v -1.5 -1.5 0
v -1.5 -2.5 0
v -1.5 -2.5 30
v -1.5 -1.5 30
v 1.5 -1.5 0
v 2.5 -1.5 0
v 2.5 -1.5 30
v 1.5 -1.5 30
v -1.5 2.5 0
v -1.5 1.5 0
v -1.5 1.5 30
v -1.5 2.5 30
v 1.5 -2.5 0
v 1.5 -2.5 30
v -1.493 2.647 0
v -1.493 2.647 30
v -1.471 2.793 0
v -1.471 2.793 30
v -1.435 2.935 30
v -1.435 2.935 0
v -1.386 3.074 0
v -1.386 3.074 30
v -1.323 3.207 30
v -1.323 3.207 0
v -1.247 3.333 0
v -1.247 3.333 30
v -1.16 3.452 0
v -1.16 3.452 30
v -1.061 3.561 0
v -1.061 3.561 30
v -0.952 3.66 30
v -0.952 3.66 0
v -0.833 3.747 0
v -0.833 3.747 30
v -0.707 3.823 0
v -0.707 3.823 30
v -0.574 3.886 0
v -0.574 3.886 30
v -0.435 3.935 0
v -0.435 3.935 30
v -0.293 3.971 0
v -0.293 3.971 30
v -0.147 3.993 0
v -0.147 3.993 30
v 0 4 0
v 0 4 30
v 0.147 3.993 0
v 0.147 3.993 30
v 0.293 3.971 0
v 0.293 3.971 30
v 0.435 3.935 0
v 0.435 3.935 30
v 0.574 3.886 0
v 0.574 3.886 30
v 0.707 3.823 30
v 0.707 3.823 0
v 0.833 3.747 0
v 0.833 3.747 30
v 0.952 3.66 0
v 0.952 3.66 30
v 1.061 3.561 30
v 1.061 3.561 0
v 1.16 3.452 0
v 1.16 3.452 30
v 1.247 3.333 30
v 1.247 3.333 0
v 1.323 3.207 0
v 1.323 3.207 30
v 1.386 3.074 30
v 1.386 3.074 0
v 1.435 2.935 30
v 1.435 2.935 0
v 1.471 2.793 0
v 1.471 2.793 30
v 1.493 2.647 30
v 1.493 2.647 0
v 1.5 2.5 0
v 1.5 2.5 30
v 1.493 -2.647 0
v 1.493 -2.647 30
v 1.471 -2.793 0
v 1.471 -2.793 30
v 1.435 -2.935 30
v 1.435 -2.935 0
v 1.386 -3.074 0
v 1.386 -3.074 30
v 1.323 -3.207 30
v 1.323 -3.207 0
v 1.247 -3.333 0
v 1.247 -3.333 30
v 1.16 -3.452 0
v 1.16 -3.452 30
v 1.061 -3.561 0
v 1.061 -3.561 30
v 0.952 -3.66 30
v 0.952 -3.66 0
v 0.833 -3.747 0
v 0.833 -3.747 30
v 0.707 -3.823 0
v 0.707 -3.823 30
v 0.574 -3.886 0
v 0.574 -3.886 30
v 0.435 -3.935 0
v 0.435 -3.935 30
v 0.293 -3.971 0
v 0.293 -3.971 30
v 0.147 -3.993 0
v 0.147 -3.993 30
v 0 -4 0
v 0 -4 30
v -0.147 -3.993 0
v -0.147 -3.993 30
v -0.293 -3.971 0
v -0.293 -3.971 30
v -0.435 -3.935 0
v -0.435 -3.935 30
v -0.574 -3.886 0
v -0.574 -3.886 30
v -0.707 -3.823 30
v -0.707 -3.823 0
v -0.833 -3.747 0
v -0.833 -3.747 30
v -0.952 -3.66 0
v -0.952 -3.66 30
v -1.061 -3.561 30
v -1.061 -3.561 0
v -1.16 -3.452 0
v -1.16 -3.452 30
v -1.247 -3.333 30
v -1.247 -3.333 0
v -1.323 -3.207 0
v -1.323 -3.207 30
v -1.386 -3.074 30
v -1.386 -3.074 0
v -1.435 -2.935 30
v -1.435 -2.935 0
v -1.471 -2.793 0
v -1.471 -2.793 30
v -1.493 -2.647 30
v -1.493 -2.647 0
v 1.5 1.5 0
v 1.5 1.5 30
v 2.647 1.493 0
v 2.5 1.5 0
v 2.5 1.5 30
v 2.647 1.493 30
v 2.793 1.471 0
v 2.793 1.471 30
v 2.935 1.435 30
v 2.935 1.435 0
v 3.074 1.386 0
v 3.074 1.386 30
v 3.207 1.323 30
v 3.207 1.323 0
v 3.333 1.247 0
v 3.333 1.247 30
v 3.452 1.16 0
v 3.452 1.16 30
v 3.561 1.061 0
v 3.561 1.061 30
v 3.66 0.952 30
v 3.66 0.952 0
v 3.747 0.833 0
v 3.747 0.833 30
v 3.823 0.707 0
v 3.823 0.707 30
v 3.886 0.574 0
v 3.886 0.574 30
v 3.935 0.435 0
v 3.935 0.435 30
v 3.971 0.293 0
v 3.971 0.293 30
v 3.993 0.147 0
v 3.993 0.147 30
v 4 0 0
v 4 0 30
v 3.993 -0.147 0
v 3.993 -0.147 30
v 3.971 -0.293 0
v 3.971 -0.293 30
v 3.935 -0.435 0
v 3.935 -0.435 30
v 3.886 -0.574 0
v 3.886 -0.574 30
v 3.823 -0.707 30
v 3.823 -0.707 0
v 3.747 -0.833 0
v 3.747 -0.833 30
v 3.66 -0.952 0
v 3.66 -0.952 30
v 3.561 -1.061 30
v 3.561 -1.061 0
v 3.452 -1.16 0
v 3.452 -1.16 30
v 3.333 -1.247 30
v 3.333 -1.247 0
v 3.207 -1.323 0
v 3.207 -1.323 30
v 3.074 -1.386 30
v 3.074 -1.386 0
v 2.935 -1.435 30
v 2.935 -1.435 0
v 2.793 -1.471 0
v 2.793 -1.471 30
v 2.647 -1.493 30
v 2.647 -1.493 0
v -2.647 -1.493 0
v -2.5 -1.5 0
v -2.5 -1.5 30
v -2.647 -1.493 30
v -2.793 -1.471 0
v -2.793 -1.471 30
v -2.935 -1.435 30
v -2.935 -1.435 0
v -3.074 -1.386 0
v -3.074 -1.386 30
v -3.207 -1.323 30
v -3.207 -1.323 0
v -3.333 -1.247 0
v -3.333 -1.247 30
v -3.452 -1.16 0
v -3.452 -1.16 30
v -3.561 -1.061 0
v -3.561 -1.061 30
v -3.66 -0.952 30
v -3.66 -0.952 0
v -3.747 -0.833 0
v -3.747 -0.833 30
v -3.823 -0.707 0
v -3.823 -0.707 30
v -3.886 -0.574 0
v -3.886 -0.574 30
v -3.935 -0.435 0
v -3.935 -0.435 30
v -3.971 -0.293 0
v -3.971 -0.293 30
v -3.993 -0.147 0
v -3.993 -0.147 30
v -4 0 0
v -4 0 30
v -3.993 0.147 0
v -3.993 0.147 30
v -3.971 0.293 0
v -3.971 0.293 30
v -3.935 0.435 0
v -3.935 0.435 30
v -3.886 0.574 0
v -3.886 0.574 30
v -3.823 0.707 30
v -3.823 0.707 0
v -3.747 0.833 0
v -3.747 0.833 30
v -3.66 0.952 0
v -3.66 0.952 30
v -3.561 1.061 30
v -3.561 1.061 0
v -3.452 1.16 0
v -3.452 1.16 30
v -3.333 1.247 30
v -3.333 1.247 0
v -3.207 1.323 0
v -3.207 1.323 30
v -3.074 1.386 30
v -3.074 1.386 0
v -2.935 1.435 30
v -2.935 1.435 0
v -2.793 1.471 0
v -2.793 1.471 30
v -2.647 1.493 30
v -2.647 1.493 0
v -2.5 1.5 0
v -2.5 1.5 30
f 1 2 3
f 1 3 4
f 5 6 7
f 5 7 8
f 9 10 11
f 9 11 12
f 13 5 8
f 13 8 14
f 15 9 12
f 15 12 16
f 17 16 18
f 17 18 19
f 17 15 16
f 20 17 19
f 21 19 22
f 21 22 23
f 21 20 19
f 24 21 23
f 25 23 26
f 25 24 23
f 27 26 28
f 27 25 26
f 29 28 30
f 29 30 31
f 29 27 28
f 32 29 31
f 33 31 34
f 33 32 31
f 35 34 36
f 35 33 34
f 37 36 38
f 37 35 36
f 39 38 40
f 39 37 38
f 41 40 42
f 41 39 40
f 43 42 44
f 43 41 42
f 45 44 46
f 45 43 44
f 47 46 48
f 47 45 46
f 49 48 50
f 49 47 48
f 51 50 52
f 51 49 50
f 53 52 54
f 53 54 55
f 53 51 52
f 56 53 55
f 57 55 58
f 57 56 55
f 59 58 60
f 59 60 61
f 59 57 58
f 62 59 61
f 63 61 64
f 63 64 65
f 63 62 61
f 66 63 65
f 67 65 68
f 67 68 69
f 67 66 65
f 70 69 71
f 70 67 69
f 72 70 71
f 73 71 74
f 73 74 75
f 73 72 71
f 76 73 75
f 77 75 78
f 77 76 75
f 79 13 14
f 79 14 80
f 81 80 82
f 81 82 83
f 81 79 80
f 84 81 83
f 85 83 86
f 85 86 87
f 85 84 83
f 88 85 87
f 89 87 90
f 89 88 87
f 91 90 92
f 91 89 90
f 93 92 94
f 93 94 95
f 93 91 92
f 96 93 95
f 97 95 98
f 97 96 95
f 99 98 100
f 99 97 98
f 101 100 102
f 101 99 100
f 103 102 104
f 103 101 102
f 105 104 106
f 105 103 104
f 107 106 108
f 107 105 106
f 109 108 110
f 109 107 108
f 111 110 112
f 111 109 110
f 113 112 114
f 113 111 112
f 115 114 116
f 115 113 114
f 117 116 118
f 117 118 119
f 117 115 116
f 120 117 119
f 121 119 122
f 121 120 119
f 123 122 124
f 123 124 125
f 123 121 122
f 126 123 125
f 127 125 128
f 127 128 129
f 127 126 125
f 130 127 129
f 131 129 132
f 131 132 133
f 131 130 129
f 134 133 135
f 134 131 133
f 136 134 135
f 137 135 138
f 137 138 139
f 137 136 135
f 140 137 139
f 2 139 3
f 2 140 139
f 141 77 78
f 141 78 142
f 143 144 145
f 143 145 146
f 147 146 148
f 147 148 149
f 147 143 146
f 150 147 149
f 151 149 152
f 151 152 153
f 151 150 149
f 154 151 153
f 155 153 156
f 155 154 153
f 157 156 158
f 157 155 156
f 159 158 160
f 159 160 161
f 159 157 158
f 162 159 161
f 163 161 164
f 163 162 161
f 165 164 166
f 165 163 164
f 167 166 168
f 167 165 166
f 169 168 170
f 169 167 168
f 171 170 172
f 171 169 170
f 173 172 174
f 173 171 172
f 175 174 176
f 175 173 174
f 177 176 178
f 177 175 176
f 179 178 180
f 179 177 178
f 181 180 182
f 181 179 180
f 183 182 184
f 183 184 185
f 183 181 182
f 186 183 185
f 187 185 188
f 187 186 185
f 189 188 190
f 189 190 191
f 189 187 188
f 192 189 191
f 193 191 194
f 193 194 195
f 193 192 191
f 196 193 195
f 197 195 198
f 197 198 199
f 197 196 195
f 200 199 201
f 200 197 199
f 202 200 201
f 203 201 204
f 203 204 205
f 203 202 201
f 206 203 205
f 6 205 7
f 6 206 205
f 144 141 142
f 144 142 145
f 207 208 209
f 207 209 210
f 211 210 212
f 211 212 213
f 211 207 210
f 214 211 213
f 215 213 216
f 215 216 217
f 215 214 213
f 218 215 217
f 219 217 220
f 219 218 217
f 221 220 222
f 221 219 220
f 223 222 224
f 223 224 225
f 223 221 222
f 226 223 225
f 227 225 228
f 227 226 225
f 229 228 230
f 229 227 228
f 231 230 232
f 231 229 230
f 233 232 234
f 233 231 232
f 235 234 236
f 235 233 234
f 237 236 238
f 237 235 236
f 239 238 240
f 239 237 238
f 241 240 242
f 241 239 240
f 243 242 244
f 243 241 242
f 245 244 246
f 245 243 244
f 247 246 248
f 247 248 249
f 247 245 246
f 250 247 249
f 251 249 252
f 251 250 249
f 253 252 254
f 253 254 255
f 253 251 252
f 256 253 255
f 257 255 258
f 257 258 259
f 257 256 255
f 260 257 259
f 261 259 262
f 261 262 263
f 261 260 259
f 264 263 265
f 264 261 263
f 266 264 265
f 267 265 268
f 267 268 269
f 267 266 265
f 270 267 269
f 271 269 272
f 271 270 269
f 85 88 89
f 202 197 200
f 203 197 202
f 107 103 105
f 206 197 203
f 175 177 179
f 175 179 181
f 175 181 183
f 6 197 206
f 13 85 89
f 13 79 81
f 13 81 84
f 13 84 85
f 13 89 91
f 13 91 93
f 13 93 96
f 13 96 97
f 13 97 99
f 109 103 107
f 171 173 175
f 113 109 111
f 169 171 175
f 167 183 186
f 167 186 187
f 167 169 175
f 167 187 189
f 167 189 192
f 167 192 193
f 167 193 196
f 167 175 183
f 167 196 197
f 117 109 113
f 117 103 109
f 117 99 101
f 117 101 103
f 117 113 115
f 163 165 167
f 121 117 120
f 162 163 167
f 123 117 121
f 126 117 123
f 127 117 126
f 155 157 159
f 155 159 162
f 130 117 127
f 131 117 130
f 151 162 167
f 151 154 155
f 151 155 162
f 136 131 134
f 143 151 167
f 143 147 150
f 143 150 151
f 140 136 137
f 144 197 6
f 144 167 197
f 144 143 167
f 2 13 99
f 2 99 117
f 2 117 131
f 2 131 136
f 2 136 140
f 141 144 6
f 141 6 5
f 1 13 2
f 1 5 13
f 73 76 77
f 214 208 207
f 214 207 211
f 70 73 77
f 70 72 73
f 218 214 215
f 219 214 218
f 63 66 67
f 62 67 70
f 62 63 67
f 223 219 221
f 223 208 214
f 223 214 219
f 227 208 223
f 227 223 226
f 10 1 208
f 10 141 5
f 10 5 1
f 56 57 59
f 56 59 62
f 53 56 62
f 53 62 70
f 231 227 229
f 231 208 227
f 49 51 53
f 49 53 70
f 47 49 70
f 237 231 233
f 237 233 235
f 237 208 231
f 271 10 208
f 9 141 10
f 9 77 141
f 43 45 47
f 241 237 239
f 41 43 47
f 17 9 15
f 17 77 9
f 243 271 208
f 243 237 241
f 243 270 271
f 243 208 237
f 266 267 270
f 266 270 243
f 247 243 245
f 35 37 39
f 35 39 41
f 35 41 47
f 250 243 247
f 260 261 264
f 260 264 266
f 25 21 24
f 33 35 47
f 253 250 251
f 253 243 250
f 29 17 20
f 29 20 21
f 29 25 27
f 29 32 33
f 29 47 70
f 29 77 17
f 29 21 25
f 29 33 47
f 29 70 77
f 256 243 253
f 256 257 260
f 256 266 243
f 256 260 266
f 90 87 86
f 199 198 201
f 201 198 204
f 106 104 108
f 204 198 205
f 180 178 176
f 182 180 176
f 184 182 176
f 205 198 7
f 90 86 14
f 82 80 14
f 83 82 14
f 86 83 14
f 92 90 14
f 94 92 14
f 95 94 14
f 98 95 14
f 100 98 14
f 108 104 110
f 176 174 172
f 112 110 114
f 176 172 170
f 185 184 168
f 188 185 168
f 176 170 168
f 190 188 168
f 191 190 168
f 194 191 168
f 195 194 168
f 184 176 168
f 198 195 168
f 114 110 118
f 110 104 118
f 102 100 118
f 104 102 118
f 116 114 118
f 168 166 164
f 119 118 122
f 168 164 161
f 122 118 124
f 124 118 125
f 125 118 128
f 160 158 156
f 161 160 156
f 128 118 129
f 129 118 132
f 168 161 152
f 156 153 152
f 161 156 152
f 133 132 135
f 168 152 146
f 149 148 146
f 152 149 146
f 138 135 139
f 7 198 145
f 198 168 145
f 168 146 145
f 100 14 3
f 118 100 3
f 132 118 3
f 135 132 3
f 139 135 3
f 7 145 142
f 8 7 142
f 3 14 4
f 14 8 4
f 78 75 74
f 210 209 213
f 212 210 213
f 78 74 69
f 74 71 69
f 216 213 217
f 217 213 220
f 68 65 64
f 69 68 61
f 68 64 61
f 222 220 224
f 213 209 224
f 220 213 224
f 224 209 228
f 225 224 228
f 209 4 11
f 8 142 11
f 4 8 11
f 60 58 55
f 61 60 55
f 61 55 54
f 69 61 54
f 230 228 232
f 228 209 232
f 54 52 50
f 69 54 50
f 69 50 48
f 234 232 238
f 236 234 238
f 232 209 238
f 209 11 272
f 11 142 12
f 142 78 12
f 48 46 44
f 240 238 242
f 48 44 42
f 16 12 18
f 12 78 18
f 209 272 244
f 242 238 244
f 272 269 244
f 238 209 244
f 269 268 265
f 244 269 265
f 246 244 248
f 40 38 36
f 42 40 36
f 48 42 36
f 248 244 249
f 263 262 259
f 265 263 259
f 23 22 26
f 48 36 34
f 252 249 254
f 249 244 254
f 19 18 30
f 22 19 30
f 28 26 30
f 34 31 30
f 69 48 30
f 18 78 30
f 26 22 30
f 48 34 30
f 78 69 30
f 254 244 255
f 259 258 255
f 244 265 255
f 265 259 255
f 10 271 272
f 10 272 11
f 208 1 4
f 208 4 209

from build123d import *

# Parameters (mm, degrees)
BOSS_EXTRUDE1_DEPTH = 30


with BuildPart() as part:
    # Sketch1 → Boss-Extrude1 (new body)
    with BuildSketch(Plane.XY):
        with BuildLine():
            Line((-2.5, 1.5), (-1.5, 1.5))
            Line((-1.5, 1.5), (-1.5, 2.5))
            ThreePointArc((-1.5, 2.5), (0, 4), (1.5, 2.5))
            Line((1.5, 2.5), (1.5, 1.5))
            Line((1.5, 1.5), (2.5, 1.5))
            ThreePointArc((2.5, 1.5), (4, 0), (2.5, -1.5))
            Line((2.5, -1.5), (1.5, -1.5))
            Line((1.5, -1.5), (1.5, -2.5))
            ThreePointArc((1.5, -2.5), (0, -4), (-1.5, -2.5))
            Line((-1.5, -2.5), (-1.5, -1.5))
            Line((-1.5, -1.5), (-2.5, -1.5))
            ThreePointArc((-2.5, -1.5), (-4, 0), (-2.5, 1.5))
        make_face()
    extrude(amount=BOSS_EXTRUDE1_DEPTH)


solid = part.part
